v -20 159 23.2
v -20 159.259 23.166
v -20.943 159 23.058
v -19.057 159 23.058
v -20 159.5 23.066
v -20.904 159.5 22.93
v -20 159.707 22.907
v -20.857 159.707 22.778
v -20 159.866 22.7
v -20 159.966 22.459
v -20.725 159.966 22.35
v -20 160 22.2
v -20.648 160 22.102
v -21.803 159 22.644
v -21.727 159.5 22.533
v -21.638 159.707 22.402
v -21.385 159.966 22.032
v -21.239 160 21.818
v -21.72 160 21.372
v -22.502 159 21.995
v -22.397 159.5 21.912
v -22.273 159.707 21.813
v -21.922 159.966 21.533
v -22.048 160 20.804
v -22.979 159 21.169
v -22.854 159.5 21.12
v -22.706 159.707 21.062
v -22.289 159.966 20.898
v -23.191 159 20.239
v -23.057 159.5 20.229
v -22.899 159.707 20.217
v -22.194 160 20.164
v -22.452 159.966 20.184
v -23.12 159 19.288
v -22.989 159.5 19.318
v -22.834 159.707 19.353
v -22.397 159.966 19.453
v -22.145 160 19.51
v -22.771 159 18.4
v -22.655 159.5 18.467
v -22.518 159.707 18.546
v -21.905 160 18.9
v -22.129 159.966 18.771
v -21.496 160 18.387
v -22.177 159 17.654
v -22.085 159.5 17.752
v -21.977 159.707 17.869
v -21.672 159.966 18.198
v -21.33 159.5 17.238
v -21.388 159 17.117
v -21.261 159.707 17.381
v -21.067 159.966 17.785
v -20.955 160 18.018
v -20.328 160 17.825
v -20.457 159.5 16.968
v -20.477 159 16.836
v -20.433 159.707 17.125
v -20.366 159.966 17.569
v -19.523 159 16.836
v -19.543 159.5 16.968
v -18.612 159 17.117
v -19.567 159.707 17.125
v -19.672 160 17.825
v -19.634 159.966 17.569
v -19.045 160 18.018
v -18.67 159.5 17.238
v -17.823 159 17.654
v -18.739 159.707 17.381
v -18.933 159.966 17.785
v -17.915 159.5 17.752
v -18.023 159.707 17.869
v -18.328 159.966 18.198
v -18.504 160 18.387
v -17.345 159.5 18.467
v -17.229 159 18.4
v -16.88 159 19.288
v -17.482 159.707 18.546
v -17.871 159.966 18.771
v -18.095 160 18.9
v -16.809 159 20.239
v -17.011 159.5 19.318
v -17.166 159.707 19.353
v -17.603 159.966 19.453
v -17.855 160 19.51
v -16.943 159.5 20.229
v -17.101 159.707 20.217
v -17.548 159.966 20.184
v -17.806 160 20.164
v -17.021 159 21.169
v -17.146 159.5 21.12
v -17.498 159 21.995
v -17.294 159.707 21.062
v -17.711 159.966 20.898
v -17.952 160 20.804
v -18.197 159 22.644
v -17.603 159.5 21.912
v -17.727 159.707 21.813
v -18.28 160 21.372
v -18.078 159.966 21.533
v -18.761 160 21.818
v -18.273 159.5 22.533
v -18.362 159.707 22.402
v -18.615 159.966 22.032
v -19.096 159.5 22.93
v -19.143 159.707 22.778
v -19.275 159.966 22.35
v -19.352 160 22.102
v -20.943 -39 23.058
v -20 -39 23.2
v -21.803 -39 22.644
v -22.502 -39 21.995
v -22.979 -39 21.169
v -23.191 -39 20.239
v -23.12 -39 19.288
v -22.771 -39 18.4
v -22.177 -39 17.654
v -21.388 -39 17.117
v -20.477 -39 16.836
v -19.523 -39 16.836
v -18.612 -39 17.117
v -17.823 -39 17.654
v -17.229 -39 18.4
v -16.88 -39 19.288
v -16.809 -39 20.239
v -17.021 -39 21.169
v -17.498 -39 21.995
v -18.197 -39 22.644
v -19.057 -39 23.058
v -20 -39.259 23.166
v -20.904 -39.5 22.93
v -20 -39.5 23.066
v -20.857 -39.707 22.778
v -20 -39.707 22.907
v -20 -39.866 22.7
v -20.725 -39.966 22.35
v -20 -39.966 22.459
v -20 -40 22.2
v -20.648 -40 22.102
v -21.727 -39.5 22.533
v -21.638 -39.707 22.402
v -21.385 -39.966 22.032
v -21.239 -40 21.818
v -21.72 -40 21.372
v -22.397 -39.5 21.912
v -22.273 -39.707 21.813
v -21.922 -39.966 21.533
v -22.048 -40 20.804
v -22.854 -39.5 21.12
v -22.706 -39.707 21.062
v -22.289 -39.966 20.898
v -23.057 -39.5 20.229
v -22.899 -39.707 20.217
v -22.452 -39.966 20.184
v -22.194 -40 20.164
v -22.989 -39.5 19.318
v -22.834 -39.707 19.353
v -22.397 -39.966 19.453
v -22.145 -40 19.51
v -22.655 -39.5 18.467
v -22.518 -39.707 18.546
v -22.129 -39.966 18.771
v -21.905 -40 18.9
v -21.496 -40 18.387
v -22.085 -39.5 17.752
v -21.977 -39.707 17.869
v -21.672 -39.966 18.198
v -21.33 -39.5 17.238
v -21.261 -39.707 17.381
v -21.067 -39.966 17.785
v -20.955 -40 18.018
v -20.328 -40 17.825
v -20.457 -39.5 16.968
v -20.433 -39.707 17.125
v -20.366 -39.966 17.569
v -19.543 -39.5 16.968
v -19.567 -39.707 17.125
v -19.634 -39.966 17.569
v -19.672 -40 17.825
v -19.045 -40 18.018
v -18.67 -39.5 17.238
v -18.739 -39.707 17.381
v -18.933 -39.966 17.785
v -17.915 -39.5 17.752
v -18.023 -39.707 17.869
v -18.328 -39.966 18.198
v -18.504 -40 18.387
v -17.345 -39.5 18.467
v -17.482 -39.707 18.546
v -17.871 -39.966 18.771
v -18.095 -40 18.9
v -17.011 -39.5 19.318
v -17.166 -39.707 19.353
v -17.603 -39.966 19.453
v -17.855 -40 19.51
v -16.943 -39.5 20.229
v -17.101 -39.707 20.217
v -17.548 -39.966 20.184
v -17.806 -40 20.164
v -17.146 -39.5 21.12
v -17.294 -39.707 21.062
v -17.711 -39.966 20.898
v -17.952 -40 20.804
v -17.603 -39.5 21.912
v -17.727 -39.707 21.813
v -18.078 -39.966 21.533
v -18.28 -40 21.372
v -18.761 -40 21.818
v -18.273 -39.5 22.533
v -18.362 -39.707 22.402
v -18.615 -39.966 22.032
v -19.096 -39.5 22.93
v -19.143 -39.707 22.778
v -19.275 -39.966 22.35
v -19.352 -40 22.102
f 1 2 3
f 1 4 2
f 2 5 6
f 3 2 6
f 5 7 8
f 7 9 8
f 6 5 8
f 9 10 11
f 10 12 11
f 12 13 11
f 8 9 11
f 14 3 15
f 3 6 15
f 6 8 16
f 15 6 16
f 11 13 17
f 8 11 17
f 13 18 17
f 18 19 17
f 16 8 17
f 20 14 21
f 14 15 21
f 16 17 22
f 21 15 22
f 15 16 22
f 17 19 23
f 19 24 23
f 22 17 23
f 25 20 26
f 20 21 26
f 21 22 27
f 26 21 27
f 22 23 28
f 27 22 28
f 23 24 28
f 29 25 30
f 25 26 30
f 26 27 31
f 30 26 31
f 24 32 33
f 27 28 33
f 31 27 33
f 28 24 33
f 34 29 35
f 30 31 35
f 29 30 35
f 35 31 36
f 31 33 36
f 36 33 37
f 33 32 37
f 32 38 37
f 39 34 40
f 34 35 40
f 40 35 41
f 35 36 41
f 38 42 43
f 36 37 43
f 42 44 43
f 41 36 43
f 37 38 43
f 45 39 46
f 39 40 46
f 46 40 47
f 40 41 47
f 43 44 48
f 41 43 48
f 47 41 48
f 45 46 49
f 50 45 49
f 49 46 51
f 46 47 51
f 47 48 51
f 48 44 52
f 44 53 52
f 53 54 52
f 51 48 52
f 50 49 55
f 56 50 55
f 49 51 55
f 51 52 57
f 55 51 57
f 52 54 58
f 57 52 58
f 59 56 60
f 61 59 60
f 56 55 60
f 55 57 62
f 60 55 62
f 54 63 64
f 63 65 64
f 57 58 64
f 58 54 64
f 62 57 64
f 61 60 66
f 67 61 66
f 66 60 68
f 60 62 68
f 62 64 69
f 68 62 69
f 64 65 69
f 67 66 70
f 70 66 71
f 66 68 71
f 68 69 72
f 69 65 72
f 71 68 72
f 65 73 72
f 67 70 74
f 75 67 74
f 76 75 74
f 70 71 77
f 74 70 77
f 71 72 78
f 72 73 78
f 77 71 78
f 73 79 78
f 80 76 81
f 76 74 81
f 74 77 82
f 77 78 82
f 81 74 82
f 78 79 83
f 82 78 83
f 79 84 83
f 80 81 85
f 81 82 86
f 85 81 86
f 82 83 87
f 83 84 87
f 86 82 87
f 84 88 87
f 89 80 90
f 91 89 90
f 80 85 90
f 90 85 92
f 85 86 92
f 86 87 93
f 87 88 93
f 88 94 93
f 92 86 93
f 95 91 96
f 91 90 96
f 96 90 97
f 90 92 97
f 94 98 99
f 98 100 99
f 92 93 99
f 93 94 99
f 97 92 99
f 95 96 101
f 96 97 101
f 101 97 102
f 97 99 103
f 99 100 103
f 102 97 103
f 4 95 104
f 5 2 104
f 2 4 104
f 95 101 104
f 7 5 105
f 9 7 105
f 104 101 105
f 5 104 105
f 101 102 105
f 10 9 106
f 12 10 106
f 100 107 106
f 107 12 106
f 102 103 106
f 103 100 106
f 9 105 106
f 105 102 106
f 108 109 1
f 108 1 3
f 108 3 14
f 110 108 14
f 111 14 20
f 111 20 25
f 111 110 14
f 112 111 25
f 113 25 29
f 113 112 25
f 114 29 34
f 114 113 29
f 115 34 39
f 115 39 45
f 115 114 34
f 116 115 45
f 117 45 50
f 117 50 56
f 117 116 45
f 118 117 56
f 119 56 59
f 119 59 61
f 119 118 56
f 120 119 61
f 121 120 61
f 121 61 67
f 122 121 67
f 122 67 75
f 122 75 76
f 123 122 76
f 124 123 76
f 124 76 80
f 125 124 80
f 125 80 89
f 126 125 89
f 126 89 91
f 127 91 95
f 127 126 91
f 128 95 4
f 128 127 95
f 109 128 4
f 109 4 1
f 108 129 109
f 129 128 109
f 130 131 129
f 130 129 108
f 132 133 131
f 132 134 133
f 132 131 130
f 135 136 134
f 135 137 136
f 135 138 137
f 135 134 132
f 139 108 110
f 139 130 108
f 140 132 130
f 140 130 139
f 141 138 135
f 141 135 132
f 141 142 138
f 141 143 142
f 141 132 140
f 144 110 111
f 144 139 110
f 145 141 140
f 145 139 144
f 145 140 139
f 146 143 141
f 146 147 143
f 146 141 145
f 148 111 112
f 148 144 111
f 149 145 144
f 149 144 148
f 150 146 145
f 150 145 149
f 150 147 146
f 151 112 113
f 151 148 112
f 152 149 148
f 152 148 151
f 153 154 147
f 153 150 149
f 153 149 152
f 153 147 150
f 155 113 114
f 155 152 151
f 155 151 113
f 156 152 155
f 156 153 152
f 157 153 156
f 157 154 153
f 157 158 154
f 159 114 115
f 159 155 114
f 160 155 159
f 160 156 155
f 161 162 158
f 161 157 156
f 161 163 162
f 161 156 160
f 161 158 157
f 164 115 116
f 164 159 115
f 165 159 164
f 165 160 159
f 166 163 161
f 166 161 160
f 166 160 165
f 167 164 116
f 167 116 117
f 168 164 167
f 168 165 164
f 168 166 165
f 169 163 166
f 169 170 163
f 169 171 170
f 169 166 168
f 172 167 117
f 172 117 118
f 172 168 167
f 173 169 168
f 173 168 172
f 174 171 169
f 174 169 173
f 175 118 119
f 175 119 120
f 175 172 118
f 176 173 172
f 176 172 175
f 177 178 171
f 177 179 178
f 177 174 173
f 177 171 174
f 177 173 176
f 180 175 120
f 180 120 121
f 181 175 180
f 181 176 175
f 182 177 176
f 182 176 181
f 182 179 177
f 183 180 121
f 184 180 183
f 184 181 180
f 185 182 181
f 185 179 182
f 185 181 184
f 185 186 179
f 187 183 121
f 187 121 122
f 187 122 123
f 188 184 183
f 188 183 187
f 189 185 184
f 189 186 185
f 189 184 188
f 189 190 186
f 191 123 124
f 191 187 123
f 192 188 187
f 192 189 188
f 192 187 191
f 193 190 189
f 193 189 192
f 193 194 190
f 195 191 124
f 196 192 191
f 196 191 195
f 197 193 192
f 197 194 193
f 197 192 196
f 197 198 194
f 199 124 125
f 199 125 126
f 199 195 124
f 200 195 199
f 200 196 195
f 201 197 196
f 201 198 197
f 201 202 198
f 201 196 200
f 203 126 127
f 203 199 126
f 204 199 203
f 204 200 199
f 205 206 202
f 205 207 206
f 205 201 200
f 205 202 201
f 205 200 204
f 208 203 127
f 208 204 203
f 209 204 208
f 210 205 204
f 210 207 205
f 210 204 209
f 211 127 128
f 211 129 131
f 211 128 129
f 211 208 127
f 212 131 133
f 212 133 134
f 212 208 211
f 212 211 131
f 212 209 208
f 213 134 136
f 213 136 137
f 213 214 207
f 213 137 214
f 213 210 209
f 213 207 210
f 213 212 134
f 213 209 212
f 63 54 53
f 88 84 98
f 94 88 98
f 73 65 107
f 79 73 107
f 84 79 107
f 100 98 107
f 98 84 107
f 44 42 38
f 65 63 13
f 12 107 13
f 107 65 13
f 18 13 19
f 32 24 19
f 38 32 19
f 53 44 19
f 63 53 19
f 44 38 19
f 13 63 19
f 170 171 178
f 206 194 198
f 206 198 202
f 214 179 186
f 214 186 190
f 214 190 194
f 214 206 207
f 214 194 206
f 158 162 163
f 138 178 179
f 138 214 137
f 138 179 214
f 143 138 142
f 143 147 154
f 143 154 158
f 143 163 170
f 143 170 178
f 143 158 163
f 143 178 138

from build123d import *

# Parameters (mm, degrees)
SKETCH002_R              = 3.2
PAD001_DEPTH             = 200
FILLET_R                 = 1
FILLET001_R              = 1
CLONE003_PLACEMENT_ANGLE = 90


with BuildPart() as part:
    # Sketch002 (on DatumPlane) → Pad001 (new body)
    with BuildSketch(Plane(origin=(0, -40, 70), x_dir=(1, 0, 0), z_dir=(0, -1, 0))):
        with Locations((20, -50)):
            Circle(SKETCH002_R)
    extrude(amount=-PAD001_DEPTH)

    # Fillet
    fillet_edges = [part.edges().sort_by_distance(p)[0] for p in [
        (16.8, -40, 20),
    ]]
    fillet(fillet_edges, radius=FILLET_R)

    # Fillet001
    fillet001_edges = [part.edges().sort_by_distance(p)[0] for p in [
        (16.8, 160, 20),
    ]]
    fillet(fillet001_edges, radius=FILLET001_R)


with BuildPart() as part_1:
    # Clone003 placement: moved
    add(part.part.rotate(Axis((0, 0, 0), (0, -1, 0)), CLONE003_PLACEMENT_ANGLE))


solid = part_1.part
